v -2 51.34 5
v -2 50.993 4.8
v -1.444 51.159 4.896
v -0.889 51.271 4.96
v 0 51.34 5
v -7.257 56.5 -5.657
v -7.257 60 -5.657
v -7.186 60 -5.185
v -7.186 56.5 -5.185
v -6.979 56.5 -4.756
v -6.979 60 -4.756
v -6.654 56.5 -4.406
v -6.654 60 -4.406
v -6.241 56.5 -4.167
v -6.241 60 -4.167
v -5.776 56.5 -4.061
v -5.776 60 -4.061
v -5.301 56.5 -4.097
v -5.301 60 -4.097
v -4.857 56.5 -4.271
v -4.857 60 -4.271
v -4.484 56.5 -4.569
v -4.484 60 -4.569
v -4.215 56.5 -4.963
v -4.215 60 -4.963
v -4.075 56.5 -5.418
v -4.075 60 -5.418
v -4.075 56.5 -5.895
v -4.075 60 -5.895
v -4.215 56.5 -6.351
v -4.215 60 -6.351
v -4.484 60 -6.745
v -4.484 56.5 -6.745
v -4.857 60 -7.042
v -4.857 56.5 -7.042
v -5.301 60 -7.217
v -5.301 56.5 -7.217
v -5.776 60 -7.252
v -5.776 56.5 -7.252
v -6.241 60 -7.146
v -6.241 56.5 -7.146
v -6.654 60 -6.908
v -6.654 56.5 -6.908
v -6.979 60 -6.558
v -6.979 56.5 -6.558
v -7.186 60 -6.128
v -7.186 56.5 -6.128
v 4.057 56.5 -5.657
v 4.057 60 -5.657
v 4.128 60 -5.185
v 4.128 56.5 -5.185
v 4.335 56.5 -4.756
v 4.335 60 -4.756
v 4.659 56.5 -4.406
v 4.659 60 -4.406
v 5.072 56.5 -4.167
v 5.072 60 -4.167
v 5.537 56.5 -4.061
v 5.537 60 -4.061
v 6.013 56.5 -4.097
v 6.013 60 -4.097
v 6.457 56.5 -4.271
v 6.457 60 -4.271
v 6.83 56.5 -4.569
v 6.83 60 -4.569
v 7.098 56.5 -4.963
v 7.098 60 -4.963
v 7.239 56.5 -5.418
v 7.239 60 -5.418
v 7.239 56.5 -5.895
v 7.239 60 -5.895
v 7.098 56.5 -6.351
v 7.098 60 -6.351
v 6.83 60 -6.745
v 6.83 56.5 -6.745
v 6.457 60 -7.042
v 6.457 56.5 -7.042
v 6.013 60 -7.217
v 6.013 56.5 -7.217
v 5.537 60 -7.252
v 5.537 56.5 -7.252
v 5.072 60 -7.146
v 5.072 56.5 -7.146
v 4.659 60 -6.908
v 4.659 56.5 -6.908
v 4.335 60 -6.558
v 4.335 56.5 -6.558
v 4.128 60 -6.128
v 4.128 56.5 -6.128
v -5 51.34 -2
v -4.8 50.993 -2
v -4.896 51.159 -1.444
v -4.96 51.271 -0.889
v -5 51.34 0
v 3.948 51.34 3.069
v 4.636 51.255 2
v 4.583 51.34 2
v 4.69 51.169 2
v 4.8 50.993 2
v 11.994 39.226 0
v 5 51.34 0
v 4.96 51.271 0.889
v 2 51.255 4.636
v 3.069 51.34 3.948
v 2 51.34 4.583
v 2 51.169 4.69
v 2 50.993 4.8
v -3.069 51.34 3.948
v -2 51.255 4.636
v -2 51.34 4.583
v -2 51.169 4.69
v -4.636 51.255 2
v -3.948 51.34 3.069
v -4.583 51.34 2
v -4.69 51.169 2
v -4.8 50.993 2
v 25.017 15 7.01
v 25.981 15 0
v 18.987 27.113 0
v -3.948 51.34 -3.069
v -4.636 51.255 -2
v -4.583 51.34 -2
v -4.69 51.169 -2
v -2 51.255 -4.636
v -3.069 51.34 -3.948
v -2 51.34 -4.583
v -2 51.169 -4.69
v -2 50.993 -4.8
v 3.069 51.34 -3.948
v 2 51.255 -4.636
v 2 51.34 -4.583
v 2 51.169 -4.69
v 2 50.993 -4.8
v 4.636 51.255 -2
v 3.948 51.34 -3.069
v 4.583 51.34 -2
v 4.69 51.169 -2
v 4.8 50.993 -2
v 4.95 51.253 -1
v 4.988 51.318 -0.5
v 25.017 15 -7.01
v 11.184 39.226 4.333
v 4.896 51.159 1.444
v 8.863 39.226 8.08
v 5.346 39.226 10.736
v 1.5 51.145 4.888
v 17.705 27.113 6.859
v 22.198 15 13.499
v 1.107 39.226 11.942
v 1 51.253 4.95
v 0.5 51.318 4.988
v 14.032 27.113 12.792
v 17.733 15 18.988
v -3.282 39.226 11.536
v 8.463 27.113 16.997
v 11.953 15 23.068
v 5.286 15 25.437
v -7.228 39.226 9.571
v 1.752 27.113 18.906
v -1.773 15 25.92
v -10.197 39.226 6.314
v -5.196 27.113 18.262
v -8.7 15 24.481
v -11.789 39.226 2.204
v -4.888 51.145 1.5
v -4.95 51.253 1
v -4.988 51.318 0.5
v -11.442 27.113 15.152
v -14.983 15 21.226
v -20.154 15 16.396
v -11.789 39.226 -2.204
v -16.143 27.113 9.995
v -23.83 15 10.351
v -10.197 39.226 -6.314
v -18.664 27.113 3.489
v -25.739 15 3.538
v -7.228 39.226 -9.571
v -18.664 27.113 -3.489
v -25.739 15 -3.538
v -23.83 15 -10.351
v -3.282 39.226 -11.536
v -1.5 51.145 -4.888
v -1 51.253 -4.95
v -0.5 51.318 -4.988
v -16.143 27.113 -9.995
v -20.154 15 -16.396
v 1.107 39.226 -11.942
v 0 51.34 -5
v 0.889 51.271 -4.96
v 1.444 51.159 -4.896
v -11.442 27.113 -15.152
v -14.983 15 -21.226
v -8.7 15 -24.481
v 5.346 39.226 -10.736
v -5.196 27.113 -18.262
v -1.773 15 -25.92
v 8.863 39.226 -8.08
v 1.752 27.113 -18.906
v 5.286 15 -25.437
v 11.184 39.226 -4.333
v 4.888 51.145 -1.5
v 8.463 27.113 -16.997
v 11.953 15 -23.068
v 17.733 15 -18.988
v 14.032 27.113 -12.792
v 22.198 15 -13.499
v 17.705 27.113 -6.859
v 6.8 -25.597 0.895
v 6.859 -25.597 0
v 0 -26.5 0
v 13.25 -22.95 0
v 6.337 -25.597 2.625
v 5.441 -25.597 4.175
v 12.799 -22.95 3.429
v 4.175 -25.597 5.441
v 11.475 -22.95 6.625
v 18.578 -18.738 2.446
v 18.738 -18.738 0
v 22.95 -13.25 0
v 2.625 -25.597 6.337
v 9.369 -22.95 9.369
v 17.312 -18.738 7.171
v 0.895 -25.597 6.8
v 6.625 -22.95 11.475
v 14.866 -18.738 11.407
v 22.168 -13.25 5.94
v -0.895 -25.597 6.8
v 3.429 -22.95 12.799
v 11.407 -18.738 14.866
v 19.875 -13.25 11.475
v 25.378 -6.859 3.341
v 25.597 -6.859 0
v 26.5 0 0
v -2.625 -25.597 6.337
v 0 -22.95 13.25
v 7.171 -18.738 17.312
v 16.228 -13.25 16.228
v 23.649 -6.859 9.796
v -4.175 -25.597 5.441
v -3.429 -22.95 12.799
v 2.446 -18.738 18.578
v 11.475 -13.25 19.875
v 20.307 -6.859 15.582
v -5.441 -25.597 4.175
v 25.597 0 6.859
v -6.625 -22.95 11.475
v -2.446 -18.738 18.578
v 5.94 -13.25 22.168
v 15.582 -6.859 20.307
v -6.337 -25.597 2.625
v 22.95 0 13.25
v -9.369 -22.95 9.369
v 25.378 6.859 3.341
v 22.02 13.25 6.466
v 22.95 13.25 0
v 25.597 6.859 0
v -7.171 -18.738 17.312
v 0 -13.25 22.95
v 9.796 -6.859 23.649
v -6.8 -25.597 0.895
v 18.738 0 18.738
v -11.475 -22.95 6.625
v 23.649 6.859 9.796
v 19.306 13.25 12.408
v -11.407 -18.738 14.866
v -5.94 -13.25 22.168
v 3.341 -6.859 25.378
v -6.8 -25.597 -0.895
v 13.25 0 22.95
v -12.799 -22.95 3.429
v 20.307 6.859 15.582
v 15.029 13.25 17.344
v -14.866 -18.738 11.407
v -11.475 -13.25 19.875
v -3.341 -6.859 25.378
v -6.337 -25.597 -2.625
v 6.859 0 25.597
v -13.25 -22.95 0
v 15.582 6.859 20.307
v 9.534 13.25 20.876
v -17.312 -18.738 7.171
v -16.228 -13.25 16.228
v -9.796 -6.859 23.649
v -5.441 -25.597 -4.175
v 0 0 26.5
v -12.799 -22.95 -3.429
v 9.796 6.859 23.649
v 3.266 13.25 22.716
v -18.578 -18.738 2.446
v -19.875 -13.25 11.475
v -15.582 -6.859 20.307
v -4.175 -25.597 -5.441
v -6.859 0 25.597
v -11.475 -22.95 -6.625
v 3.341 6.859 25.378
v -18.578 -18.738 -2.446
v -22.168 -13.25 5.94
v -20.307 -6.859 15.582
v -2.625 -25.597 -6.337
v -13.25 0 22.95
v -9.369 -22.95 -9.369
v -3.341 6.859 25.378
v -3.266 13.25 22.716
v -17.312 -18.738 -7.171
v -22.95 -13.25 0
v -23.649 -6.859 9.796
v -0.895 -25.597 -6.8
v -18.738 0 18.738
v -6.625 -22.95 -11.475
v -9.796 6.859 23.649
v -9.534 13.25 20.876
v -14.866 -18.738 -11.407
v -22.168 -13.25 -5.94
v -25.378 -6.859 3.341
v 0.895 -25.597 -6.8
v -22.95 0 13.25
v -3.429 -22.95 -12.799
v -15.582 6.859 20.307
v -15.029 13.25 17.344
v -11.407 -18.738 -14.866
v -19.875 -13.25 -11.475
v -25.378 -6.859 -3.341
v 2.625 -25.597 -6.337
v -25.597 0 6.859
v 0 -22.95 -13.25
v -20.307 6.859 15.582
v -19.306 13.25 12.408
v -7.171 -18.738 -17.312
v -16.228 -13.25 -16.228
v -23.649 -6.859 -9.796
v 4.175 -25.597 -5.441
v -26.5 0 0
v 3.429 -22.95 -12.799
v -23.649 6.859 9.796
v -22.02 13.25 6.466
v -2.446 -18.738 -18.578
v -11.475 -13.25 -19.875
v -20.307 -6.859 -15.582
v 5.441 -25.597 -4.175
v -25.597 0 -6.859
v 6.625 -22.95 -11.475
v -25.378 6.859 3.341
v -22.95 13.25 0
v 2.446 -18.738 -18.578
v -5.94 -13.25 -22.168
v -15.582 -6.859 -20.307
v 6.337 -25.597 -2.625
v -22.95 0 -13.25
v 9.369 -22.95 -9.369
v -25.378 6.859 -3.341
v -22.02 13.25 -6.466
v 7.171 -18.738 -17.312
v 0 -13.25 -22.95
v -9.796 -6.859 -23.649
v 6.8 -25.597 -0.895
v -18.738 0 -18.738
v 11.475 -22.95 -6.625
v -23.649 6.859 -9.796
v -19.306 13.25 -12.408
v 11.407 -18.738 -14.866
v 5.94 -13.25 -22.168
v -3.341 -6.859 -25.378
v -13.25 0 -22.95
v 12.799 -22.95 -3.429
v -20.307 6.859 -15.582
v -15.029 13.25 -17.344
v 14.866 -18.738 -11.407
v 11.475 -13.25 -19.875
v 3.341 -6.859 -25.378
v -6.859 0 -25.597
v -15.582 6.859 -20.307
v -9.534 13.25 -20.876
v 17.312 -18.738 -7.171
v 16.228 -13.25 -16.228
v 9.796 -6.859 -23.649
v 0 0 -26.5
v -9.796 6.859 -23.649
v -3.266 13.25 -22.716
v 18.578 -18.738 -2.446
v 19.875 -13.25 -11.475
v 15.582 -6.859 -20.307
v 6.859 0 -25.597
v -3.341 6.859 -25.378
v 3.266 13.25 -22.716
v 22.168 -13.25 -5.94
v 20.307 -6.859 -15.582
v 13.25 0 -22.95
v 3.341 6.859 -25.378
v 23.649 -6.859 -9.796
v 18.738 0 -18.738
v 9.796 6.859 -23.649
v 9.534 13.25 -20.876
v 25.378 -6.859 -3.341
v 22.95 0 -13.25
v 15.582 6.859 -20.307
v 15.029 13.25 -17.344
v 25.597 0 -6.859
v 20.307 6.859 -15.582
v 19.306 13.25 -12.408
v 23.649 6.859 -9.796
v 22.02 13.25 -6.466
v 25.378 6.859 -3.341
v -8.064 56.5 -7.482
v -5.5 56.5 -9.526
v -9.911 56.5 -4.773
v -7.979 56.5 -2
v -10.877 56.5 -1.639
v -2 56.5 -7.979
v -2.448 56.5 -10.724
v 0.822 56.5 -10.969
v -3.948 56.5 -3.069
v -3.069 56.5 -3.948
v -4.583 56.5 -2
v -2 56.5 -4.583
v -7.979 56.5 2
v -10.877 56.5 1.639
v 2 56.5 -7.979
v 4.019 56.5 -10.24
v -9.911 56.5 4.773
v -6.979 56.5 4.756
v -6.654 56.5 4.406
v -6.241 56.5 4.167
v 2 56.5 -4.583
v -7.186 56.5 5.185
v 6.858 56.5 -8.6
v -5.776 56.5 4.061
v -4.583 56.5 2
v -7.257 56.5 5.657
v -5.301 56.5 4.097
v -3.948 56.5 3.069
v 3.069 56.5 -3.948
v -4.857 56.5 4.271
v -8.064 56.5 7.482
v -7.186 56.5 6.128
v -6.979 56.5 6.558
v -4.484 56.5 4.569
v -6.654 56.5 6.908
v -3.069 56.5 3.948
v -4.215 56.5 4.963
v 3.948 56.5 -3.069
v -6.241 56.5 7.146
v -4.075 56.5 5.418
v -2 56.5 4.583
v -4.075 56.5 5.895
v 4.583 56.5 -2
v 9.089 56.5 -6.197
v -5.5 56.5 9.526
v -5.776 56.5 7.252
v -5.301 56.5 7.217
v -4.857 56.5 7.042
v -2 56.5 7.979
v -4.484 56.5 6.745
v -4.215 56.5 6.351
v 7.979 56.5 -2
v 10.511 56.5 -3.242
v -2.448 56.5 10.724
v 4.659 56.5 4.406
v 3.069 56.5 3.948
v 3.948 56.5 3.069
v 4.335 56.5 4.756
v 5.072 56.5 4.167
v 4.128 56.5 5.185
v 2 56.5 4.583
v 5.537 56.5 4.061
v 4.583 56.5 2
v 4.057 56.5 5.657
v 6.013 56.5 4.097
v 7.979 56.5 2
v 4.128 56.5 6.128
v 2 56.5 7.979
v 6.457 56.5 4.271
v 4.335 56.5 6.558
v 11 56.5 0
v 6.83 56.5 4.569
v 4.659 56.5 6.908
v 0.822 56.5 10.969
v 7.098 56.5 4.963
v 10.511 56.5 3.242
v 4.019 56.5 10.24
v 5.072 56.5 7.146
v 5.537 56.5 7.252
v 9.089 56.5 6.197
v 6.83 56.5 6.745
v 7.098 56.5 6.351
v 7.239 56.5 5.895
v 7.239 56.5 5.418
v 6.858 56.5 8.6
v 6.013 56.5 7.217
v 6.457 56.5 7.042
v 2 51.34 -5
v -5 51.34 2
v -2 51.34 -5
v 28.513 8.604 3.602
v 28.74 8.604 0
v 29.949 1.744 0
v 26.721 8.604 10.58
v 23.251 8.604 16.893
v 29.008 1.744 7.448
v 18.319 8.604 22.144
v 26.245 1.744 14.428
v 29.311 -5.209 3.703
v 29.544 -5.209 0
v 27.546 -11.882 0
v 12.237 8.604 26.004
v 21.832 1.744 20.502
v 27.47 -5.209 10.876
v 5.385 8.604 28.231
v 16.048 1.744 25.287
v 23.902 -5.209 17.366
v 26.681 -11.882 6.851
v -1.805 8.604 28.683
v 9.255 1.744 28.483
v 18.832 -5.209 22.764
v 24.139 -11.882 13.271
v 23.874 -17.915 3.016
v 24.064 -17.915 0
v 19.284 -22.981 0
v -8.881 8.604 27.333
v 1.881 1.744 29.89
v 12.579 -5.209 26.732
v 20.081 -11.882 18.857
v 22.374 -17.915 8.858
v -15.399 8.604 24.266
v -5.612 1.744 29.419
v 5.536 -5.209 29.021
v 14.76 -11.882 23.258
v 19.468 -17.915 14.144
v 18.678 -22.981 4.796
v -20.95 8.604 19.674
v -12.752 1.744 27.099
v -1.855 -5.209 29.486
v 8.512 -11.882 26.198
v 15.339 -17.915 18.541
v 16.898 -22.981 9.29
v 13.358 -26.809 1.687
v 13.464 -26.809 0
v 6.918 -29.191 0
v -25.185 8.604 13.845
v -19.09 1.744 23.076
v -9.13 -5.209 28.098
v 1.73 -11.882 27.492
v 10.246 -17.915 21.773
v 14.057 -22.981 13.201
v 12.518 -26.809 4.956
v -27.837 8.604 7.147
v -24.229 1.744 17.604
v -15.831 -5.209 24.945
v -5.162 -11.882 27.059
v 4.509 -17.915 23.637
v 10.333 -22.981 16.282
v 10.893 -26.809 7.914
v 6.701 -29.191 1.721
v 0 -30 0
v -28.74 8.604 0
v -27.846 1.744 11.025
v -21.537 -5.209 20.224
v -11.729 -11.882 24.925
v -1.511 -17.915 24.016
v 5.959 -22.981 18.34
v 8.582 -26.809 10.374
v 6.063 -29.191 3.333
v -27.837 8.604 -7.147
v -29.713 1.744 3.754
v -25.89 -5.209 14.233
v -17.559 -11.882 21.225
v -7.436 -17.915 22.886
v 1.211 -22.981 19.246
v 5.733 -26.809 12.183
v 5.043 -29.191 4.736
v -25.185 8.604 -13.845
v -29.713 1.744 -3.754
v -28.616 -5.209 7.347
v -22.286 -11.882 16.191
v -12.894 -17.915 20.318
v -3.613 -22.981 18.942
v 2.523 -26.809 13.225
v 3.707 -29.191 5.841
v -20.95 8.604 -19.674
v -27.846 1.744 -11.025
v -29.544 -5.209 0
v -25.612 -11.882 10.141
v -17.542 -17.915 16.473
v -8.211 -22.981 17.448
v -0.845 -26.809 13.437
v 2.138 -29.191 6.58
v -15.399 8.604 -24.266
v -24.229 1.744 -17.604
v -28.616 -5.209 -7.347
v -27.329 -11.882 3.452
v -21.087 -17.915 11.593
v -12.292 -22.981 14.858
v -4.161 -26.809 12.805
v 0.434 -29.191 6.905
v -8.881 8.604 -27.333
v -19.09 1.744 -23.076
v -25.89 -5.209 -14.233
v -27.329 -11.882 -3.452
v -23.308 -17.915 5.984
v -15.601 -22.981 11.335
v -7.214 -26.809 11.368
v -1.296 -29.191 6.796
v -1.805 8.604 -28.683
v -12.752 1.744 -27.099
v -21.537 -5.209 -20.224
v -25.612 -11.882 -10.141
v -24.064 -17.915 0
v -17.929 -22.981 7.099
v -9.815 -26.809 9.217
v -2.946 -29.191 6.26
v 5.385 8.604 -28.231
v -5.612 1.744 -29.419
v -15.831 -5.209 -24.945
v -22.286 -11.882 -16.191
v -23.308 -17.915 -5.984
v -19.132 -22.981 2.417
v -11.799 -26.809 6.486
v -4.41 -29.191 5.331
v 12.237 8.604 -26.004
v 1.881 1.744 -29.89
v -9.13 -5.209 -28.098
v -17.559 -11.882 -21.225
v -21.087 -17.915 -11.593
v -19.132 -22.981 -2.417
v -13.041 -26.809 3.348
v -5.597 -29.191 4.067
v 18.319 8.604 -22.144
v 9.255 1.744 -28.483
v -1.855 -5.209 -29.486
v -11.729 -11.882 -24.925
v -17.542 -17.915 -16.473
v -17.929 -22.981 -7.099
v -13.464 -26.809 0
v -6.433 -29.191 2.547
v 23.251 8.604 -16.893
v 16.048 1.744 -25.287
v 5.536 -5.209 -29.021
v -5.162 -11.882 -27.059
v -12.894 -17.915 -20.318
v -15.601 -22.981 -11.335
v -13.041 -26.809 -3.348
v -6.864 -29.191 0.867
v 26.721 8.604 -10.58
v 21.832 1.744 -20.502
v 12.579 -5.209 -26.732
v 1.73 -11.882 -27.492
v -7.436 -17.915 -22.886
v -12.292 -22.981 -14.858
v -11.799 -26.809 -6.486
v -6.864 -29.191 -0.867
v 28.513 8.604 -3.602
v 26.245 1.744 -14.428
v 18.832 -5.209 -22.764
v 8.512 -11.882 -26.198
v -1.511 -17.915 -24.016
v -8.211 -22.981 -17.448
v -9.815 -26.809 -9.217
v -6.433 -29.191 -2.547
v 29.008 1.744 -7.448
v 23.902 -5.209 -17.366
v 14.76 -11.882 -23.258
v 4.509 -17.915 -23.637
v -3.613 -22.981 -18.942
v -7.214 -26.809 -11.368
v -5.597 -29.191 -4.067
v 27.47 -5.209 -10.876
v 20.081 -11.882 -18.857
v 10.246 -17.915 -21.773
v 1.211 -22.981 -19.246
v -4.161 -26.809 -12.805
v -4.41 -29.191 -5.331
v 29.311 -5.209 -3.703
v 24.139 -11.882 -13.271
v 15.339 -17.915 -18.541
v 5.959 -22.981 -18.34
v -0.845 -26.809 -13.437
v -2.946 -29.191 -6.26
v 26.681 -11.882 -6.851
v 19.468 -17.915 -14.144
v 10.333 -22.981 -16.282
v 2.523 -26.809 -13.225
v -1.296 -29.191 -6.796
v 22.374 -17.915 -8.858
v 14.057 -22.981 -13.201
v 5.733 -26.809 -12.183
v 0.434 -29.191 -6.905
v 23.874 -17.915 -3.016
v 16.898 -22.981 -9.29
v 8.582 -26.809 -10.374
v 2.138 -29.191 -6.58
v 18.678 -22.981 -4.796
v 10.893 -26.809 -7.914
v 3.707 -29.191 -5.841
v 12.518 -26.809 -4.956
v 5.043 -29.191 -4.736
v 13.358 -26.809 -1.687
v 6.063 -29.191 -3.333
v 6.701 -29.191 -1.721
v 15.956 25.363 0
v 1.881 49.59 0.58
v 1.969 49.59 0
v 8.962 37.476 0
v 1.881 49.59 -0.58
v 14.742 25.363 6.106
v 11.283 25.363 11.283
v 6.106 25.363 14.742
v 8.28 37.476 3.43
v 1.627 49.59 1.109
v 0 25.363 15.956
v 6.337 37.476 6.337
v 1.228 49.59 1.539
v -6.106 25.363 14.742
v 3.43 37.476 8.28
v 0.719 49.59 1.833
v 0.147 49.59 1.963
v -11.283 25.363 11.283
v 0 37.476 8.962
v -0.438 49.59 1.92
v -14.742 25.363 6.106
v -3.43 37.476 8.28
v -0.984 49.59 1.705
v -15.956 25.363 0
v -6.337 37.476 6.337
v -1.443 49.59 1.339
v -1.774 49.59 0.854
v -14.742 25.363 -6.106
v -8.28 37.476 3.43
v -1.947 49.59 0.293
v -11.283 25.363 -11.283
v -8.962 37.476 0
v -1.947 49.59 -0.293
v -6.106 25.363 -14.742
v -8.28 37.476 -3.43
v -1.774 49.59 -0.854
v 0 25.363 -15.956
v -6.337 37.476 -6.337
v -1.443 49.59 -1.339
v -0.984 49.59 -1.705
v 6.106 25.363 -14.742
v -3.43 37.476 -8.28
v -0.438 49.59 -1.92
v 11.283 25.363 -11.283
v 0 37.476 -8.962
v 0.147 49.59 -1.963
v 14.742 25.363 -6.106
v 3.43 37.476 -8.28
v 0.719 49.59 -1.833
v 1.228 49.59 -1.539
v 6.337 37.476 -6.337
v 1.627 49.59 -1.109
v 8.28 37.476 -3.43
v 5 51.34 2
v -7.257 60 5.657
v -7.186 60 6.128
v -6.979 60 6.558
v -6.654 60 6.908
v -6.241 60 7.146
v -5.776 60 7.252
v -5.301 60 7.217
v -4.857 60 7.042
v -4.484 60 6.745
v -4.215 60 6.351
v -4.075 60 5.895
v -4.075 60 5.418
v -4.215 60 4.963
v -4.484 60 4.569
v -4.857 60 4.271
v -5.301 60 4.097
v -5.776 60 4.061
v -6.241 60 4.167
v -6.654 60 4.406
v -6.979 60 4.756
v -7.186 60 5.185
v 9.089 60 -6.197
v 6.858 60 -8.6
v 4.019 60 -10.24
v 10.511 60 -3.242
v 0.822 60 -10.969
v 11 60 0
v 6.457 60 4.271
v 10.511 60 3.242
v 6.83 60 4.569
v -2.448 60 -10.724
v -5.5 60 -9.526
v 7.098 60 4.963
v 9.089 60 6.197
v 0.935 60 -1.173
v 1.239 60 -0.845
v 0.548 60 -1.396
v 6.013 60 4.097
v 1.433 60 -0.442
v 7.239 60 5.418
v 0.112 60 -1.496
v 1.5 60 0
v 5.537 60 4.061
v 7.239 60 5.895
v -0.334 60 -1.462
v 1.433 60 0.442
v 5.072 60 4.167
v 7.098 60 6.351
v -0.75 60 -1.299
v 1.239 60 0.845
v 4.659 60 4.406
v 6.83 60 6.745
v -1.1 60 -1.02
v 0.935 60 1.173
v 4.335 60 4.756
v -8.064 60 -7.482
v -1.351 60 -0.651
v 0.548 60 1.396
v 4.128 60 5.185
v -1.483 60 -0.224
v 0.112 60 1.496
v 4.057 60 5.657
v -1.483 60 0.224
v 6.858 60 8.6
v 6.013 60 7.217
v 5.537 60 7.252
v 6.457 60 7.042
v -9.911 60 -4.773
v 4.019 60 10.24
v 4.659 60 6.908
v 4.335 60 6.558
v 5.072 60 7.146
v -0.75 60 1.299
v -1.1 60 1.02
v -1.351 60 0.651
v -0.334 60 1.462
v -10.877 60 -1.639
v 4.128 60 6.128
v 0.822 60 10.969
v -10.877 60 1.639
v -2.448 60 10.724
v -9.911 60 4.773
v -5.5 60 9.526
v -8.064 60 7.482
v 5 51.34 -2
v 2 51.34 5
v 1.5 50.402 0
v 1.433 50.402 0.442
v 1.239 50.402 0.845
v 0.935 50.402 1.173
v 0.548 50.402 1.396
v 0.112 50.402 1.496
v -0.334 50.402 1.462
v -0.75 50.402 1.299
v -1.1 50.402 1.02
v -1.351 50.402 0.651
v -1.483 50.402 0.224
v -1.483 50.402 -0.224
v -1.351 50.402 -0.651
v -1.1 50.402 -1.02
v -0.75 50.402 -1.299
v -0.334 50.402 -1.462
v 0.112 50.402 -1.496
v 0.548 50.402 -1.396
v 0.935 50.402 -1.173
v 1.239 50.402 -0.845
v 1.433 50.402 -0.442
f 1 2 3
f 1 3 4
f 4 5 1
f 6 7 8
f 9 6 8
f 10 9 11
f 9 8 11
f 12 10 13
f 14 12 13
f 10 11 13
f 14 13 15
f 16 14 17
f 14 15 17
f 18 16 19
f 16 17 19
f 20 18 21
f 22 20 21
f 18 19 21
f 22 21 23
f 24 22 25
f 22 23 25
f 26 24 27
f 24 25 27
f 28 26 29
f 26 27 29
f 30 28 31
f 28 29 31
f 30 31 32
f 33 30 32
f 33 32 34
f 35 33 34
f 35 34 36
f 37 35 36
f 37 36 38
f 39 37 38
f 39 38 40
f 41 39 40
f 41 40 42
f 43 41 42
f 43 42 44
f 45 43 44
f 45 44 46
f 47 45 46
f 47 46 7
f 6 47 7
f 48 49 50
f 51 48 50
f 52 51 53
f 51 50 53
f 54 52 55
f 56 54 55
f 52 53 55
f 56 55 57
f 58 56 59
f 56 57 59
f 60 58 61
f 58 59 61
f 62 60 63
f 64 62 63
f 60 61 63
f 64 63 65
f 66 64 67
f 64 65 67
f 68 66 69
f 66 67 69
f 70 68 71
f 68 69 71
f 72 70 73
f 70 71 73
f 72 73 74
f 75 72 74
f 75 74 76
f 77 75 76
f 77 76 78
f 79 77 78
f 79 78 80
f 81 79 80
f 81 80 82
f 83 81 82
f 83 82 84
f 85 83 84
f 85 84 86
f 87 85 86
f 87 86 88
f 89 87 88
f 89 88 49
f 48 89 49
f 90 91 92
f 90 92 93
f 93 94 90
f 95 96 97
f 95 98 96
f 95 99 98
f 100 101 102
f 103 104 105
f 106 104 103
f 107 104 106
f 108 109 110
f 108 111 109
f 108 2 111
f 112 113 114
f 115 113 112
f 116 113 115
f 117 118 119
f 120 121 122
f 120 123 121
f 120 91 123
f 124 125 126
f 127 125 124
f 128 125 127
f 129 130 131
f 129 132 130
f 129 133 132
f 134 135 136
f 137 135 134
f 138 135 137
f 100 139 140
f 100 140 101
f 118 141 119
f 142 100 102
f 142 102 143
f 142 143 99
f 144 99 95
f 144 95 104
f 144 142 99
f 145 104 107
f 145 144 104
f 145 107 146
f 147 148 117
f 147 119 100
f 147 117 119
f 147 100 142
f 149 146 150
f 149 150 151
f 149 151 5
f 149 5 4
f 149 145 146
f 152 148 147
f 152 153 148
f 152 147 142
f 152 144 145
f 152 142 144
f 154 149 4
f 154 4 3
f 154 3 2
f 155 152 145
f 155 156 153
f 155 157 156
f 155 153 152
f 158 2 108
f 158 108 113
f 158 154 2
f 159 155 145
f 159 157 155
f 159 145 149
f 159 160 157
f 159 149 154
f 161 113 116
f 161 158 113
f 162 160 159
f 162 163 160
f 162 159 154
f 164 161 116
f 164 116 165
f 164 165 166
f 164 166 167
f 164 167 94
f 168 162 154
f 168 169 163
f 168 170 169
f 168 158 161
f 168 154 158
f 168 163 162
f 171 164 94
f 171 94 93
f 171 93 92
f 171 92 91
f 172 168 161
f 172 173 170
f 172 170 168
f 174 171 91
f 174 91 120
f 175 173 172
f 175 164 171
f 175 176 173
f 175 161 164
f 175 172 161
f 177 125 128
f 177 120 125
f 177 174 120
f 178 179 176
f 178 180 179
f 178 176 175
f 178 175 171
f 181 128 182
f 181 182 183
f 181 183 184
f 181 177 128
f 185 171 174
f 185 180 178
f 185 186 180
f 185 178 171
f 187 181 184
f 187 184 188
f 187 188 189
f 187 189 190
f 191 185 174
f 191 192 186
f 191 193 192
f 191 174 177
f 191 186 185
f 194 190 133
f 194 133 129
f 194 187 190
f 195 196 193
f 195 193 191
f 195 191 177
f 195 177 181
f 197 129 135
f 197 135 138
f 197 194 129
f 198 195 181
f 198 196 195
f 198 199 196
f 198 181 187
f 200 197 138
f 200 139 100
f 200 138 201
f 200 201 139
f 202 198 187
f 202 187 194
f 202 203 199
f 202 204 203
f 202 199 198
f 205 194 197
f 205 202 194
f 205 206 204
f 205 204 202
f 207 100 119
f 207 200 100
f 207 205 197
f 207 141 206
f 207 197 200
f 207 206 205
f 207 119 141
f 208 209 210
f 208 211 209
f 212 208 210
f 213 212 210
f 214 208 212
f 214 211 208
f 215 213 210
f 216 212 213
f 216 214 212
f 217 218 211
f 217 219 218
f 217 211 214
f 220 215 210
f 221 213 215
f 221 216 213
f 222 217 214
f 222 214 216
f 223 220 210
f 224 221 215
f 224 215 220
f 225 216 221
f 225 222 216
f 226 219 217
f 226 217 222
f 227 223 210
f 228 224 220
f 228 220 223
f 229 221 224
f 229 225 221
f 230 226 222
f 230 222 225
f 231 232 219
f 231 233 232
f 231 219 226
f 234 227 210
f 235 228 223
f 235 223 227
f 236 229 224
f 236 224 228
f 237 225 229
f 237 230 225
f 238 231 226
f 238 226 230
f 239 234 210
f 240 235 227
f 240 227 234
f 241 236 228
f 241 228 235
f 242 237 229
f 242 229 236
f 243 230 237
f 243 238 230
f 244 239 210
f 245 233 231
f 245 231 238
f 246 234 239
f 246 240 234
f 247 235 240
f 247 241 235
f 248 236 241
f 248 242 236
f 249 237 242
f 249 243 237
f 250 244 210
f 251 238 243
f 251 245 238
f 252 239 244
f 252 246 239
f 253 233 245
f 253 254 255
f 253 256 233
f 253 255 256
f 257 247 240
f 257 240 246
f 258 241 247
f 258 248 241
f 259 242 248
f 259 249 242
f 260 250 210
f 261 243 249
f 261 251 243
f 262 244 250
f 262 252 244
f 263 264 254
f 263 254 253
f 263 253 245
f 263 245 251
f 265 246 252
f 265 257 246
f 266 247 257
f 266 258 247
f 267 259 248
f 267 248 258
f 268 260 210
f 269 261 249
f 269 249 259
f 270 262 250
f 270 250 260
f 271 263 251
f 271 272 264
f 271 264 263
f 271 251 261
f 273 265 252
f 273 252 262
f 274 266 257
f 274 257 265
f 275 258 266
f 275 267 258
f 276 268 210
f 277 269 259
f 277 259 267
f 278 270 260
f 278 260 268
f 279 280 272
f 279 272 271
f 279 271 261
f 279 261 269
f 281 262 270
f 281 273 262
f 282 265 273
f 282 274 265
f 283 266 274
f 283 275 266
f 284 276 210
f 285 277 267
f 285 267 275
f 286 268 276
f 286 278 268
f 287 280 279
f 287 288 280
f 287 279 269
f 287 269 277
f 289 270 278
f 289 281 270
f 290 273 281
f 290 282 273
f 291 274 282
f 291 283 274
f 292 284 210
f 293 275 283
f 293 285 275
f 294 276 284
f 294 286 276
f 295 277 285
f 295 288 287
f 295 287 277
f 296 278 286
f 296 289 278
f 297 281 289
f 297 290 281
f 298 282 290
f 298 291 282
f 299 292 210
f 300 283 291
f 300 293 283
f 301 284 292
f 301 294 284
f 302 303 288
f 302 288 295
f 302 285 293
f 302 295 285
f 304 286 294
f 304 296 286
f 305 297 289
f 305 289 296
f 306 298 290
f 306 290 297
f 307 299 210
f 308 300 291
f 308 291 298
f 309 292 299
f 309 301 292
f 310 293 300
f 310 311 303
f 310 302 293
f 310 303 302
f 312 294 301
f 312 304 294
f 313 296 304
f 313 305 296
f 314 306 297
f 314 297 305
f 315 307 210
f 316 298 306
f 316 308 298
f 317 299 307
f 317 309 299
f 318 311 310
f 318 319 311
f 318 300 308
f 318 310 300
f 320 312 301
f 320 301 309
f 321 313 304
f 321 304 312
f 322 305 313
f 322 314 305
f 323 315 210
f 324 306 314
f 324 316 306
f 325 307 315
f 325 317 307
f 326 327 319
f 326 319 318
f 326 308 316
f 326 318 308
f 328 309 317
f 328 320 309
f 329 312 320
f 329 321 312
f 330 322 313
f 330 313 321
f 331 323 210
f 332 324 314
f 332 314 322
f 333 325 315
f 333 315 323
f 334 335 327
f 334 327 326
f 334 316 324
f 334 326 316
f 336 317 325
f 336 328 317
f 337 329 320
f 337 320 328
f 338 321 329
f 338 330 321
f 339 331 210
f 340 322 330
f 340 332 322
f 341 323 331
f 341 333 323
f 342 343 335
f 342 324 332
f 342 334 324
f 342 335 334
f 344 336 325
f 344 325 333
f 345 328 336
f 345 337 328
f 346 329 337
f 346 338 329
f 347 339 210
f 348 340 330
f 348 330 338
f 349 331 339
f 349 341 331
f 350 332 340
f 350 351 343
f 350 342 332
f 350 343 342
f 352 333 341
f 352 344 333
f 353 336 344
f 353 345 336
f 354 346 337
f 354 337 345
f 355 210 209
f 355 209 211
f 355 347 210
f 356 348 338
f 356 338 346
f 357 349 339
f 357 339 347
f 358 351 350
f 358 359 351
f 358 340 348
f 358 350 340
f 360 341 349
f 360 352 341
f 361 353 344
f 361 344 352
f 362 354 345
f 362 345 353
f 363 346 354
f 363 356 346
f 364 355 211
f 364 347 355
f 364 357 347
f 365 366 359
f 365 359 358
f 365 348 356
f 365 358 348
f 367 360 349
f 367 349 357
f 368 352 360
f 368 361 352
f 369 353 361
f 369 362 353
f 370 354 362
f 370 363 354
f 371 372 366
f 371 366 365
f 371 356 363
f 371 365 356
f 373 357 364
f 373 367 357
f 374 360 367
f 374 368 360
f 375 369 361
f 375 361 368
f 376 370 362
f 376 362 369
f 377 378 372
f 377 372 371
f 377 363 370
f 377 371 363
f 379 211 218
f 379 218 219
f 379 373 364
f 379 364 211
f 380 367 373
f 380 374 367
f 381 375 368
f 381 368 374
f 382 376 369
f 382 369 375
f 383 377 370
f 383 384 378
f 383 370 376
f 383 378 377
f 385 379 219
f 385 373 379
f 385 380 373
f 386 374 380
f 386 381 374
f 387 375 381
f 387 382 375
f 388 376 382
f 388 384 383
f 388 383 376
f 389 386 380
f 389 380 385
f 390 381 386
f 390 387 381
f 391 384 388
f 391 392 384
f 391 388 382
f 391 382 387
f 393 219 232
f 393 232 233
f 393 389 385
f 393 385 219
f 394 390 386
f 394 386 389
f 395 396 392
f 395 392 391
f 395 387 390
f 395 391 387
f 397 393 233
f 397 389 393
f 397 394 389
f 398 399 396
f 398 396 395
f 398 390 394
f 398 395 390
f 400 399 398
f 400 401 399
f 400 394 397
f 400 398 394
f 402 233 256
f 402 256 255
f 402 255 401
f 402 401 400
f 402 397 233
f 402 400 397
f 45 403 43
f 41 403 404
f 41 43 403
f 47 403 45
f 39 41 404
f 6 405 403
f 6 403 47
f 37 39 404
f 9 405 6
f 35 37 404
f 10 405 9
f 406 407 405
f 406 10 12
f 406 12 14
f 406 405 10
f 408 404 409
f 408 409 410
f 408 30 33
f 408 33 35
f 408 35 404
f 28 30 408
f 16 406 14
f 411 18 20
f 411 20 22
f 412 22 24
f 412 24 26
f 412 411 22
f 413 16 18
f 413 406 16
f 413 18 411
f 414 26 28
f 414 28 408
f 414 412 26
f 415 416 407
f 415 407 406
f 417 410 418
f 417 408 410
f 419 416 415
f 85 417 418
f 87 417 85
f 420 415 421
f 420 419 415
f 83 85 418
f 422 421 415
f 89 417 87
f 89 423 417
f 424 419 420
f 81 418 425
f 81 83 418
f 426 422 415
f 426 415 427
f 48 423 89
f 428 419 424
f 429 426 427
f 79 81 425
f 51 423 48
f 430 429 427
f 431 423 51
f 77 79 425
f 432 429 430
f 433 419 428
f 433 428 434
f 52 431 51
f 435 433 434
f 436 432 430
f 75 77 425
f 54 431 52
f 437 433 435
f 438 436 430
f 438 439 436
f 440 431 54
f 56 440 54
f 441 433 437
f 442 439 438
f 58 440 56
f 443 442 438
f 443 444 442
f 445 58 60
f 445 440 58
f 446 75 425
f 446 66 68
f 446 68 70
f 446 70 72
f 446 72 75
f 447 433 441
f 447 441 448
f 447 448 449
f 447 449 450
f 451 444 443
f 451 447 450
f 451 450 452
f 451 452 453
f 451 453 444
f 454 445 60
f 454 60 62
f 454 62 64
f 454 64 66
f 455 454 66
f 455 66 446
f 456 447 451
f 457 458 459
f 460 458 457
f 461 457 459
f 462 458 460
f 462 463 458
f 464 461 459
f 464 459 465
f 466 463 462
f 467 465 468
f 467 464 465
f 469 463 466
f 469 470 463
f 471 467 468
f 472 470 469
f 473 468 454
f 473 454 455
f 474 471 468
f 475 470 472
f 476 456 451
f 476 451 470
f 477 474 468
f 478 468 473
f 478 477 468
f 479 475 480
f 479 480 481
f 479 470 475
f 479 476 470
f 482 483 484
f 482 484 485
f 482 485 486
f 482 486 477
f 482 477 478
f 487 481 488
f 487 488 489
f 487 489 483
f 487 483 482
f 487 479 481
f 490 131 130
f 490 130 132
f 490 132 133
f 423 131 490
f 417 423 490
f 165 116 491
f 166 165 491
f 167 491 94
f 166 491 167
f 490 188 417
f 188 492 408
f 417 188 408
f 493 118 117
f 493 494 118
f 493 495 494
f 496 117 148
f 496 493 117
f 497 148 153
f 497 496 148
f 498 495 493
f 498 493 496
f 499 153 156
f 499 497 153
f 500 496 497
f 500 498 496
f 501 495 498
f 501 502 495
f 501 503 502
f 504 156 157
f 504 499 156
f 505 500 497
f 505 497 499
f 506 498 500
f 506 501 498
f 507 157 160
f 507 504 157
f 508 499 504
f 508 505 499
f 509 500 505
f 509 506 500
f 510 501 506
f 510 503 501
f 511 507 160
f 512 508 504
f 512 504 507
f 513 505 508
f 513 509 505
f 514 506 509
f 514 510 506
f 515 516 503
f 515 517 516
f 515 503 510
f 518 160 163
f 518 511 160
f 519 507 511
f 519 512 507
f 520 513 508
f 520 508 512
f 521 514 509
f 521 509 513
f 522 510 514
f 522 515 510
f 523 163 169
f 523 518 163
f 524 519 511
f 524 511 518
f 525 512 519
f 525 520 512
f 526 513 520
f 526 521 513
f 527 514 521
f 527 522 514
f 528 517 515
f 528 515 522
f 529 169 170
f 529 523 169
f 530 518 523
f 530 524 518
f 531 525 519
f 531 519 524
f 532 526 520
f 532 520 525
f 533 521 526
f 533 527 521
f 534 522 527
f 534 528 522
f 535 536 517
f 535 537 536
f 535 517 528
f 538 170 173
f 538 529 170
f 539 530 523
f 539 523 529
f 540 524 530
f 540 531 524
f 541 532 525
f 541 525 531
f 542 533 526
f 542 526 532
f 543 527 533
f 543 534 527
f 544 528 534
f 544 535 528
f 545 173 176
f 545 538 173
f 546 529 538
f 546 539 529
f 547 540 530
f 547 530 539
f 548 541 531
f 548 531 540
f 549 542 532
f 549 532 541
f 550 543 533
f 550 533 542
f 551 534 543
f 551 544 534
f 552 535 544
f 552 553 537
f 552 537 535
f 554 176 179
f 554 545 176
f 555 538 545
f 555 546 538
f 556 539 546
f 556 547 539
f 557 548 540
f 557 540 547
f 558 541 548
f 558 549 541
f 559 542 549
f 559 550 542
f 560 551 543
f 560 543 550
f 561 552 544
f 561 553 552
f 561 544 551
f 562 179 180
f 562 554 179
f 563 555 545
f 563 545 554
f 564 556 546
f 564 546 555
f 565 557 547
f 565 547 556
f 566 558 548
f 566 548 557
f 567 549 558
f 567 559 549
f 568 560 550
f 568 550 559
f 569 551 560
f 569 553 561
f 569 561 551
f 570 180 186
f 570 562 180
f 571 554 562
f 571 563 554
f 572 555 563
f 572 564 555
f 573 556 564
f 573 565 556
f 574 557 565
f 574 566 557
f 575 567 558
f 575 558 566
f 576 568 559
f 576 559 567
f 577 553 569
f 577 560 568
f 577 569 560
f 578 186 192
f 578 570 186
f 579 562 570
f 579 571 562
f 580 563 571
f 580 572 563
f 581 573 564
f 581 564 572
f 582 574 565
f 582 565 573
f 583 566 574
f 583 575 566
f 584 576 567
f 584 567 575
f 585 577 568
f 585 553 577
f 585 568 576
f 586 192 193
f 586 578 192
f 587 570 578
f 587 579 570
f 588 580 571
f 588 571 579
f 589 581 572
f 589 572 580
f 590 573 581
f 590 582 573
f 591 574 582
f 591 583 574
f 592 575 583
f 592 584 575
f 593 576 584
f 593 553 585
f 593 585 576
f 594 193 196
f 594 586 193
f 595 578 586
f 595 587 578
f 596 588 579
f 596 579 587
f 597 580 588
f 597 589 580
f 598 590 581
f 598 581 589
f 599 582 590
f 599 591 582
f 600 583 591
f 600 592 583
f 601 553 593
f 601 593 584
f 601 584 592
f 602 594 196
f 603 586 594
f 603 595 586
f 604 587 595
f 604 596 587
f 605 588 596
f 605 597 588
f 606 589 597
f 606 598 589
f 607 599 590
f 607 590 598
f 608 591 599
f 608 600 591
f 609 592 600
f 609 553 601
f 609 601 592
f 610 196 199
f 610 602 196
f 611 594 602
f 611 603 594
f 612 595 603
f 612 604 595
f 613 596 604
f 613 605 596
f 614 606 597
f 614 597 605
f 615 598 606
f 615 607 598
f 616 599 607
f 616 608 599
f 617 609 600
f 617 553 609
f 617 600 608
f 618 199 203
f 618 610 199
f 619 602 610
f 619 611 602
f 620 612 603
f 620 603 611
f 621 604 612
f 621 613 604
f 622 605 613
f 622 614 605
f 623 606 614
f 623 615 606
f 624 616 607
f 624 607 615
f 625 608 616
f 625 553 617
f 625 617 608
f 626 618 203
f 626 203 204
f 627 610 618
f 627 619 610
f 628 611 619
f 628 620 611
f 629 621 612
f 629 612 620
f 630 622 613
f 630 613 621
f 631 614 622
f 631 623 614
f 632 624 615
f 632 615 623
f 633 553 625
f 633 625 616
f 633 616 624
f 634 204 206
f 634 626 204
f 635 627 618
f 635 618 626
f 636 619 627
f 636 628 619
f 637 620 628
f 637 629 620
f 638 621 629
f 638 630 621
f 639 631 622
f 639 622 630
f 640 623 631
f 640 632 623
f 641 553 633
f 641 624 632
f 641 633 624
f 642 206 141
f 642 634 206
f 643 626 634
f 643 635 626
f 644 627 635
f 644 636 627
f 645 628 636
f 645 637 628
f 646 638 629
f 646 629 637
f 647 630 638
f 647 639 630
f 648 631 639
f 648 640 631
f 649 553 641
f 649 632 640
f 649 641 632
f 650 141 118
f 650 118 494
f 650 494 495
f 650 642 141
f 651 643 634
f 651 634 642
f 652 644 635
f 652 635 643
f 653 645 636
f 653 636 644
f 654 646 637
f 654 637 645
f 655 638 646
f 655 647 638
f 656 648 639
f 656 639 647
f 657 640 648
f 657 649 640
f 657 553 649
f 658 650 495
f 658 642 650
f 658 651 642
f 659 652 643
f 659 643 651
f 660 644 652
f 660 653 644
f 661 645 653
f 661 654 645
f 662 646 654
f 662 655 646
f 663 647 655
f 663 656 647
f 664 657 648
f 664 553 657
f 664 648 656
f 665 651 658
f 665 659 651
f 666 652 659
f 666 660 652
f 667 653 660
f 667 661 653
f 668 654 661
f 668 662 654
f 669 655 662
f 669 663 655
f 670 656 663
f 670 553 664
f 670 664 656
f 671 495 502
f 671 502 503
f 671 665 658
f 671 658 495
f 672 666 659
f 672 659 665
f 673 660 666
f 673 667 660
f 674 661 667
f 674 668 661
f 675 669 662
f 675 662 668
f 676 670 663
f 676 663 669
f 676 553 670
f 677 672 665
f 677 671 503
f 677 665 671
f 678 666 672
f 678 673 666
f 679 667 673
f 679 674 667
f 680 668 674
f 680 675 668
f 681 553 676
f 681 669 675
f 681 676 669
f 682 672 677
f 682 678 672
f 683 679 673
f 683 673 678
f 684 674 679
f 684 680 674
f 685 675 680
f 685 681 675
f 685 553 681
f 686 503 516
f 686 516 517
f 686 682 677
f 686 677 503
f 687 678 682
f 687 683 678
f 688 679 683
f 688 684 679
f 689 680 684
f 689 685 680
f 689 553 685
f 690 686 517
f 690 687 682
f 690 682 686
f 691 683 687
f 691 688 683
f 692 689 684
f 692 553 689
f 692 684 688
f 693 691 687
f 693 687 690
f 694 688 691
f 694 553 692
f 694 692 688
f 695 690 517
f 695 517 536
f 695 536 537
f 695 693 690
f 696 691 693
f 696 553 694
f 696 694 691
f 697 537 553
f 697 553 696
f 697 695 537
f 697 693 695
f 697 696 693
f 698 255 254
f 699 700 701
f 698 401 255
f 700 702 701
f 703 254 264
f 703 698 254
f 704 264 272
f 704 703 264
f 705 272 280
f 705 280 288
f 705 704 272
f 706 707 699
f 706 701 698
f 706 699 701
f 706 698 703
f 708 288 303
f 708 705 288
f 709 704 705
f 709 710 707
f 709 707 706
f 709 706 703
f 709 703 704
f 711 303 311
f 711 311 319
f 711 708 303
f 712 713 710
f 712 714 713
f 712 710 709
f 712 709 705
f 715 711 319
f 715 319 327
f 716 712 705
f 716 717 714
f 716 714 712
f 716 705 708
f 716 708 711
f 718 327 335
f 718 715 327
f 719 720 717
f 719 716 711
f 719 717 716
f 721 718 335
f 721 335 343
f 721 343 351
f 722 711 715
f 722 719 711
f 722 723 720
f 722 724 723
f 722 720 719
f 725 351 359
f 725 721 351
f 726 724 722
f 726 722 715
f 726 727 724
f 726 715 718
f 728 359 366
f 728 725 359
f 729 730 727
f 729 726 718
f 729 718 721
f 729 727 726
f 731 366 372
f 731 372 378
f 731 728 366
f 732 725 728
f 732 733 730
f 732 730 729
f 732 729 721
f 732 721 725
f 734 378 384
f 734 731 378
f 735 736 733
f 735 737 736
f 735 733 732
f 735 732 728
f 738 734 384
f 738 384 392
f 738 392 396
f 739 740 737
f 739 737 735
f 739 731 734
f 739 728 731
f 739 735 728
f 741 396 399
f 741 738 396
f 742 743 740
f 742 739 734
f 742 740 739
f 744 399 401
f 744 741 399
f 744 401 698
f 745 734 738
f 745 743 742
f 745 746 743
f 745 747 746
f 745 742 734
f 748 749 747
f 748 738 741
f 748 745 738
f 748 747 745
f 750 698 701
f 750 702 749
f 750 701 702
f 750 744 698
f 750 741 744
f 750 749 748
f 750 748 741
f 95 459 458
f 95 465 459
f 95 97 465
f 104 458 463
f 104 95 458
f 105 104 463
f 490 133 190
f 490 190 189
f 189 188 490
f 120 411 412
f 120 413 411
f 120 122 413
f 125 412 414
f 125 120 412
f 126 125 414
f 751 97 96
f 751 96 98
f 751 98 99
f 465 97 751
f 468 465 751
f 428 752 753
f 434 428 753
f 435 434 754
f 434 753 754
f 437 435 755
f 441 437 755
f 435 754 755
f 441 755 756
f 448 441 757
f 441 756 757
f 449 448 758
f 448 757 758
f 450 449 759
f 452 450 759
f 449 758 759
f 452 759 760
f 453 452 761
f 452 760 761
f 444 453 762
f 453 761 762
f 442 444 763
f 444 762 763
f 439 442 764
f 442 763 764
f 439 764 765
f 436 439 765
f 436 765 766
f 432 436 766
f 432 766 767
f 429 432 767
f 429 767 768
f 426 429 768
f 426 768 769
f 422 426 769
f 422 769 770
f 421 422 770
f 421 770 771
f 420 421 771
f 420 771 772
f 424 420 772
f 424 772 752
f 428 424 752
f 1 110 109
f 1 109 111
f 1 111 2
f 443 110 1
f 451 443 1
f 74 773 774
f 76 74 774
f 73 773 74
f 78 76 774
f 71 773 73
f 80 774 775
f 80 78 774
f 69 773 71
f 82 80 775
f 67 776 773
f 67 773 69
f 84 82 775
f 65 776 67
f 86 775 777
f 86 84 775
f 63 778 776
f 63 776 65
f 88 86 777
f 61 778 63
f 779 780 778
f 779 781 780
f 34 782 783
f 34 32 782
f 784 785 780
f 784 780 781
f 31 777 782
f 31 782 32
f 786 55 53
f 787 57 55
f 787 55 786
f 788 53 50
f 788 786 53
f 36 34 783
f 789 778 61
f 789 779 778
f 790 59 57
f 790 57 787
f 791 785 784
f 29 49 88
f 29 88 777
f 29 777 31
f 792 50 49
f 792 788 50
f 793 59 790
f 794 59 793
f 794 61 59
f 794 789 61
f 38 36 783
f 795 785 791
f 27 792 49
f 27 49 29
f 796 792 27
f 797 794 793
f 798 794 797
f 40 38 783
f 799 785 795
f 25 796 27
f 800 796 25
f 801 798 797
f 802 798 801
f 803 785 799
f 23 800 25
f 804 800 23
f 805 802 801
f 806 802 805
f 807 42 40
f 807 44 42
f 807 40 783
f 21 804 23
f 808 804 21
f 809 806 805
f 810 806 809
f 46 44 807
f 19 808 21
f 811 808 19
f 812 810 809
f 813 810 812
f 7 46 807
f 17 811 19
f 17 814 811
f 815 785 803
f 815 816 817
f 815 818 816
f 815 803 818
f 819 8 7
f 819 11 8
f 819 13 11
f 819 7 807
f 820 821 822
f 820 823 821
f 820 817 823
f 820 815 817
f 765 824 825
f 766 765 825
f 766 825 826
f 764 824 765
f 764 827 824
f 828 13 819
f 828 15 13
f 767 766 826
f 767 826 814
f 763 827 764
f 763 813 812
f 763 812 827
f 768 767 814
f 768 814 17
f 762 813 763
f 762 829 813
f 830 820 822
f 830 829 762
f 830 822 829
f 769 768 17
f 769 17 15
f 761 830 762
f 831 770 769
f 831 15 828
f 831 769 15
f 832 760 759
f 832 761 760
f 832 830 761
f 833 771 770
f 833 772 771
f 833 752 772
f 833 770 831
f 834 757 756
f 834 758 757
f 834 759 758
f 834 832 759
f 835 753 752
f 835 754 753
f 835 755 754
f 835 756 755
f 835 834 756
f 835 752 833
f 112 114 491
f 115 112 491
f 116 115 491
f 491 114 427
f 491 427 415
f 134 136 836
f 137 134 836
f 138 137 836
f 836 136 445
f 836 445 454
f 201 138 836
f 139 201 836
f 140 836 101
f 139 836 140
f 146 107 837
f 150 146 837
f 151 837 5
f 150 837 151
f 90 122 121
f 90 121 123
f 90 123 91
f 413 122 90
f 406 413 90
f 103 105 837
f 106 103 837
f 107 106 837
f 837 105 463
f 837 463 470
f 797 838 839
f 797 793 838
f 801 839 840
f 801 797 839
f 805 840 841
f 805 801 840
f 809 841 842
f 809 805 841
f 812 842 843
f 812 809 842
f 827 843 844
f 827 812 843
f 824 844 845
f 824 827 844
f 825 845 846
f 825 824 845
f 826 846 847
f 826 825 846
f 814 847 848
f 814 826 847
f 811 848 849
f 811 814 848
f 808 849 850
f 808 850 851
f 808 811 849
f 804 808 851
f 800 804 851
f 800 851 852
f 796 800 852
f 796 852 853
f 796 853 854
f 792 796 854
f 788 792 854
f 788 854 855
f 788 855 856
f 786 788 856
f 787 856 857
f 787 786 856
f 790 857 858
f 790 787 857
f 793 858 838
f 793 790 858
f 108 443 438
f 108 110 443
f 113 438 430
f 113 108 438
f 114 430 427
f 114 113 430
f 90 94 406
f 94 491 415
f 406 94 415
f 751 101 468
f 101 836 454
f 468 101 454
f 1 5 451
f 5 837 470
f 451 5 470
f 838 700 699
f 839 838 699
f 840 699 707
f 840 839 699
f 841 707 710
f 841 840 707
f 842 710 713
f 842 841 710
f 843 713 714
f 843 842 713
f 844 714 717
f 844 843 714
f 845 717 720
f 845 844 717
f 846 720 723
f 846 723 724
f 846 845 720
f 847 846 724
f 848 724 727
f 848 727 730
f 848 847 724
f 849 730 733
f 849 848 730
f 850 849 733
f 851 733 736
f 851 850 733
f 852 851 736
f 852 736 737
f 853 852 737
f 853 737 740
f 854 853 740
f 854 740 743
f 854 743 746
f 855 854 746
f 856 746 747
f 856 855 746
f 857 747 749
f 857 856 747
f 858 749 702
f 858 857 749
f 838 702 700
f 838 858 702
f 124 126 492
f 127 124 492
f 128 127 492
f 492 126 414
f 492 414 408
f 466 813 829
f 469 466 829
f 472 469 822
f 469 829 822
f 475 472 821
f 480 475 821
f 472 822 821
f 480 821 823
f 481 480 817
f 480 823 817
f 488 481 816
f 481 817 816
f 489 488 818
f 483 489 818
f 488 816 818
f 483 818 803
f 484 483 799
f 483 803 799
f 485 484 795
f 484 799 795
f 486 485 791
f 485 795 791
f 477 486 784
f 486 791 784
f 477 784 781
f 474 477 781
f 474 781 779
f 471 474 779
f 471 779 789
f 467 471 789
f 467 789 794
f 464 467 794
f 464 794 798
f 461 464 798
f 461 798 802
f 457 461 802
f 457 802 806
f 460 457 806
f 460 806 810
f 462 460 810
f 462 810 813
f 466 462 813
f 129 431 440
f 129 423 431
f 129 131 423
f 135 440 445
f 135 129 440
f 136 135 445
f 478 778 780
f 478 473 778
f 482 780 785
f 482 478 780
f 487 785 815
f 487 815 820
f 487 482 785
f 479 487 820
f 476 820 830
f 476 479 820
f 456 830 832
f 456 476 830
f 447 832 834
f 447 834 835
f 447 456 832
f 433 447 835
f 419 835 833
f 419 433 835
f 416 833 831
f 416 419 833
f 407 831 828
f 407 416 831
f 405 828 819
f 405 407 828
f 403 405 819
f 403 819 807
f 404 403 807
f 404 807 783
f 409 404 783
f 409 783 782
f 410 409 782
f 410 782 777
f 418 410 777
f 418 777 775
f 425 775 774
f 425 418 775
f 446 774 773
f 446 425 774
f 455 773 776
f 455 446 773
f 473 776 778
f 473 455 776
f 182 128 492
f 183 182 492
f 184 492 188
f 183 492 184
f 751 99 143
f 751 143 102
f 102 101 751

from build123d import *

# Parameters (mm, degrees)
CUT_EXTRUDE_1_REACH      = 101.499
SKETCH_3_R               = 1.6
EXTRUDE_1_DEPTH          = 2
PATTERN_CIRCULAR_1_COUNT = 4


with BuildPart() as part:
    # 草图2 → 旋转1 (revolve)
    with BuildSketch(Plane.XY):
        with BuildLine():
            Line((5, 51.339745962), (25.980762114, 15))
            ThreePointArc((25.980762114, 15), (25.980762114, -15), (0, -30))
            Line((0, -30), (0, -26.5))
            ThreePointArc((0, -26.5), (22.9496732, -13.25), (22.9496732, 13.25))
            Line((22.9496732, 13.25), (1.968911087, 49.589745962))
            Line((1.968911087, 49.589745962), (1.5, 50.401923789))
            Line((1.5, 50.401923789), (1.5, 60))
            Line((1.5, 60), (11, 60))
            Line((11, 60), (11, 56.5))
            Line((11, 56.5), (5, 56.5))
            Line((5, 56.5), (5, 51.339745962))
        make_face()
    revolve(axis=Axis((0, -26.5, 0), (0, -1, 0)))

    # 草图3 → 切除-拉伸1 (cut, up to next)
    with BuildSketch(Plane(origin=(0, 60, 0), x_dir=(1, 0, 0), z_dir=(0, 1, 0)), mode=Mode.PRIVATE) as cut_extrude_1_sk1:
        with Locations((-5.656854249, 5.656854249)):
            Circle(SKETCH_3_R)
    cut_extrude_1_tool1 = extrude(cut_extrude_1_sk1.sketch, amount=-CUT_EXTRUDE_1_REACH, mode=Mode.PRIVATE) & part.part
    # 草图3 → 切除-拉伸1 (cut, up to next)
    with BuildSketch(Plane(origin=(0, 60, 0), x_dir=(1, 0, 0), z_dir=(0, 1, 0)), mode=Mode.PRIVATE) as cut_extrude_1_sk2:
        with Locations((5.656854249, 5.656854249)):
            Circle(SKETCH_3_R)
    cut_extrude_1_tool2 = extrude(cut_extrude_1_sk2.sketch, amount=-CUT_EXTRUDE_1_REACH, mode=Mode.PRIVATE) & part.part
    # 草图3 → 切除-拉伸1 (cut, up to next)
    with BuildSketch(Plane(origin=(0, 60, 0), x_dir=(1, 0, 0), z_dir=(0, 1, 0)), mode=Mode.PRIVATE) as cut_extrude_1_sk3:
        with Locations((5.656854249, -5.656854249)):
            Circle(SKETCH_3_R)
    cut_extrude_1_tool3 = extrude(cut_extrude_1_sk3.sketch, amount=-CUT_EXTRUDE_1_REACH, mode=Mode.PRIVATE) & part.part
    # 草图3 → 切除-拉伸1 (cut, up to next)
    with BuildSketch(Plane(origin=(0, 60, 0), x_dir=(1, 0, 0), z_dir=(0, 1, 0)), mode=Mode.PRIVATE) as cut_extrude_1_sk4:
        with Locations((-5.656854249, -5.656854249)):
            Circle(SKETCH_3_R)
    cut_extrude_1_tool4 = extrude(cut_extrude_1_sk4.sketch, amount=-CUT_EXTRUDE_1_REACH, mode=Mode.PRIVATE) & part.part
    add(cut_extrude_1_tool1.solids().sort_by_distance((-5.656854, 60, -5.656854))[0], mode=Mode.SUBTRACT)
    add(cut_extrude_1_tool2.solids().sort_by_distance((5.656854, 60, -5.656854))[0], mode=Mode.SUBTRACT)
    add(cut_extrude_1_tool3.solids().sort_by_distance((5.656854, 60, 5.656854))[0], mode=Mode.SUBTRACT)
    add(cut_extrude_1_tool4.solids().sort_by_distance((-5.656854, 60, 5.656854))[0], mode=Mode.SUBTRACT)

    # 草图4 → 凸台-拉伸1 (add, symmetric)
    with BuildSketch(Plane.XY):
        Polygon((-5, 51.339745962), (-7.979274058, 56.5), (-8.520148677, 57.436822322), (-4.121868793, 57.436822322), (-4.121868793, 49.818778096), align=None)
    extrude_1 = extrude(amount=EXTRUDE_1_DEPTH, both=True)

    # 阵列(圆周)1: 凸台-拉伸1 ×4 about axis
    pattern_circular_1_axis = Axis((0, 60, 0), (0, 1, 0))
    for i in range(1, PATTERN_CIRCULAR_1_COUNT):
        add(extrude_1.rotate(pattern_circular_1_axis, i * 360 / PATTERN_CIRCULAR_1_COUNT))


solid = part.part
